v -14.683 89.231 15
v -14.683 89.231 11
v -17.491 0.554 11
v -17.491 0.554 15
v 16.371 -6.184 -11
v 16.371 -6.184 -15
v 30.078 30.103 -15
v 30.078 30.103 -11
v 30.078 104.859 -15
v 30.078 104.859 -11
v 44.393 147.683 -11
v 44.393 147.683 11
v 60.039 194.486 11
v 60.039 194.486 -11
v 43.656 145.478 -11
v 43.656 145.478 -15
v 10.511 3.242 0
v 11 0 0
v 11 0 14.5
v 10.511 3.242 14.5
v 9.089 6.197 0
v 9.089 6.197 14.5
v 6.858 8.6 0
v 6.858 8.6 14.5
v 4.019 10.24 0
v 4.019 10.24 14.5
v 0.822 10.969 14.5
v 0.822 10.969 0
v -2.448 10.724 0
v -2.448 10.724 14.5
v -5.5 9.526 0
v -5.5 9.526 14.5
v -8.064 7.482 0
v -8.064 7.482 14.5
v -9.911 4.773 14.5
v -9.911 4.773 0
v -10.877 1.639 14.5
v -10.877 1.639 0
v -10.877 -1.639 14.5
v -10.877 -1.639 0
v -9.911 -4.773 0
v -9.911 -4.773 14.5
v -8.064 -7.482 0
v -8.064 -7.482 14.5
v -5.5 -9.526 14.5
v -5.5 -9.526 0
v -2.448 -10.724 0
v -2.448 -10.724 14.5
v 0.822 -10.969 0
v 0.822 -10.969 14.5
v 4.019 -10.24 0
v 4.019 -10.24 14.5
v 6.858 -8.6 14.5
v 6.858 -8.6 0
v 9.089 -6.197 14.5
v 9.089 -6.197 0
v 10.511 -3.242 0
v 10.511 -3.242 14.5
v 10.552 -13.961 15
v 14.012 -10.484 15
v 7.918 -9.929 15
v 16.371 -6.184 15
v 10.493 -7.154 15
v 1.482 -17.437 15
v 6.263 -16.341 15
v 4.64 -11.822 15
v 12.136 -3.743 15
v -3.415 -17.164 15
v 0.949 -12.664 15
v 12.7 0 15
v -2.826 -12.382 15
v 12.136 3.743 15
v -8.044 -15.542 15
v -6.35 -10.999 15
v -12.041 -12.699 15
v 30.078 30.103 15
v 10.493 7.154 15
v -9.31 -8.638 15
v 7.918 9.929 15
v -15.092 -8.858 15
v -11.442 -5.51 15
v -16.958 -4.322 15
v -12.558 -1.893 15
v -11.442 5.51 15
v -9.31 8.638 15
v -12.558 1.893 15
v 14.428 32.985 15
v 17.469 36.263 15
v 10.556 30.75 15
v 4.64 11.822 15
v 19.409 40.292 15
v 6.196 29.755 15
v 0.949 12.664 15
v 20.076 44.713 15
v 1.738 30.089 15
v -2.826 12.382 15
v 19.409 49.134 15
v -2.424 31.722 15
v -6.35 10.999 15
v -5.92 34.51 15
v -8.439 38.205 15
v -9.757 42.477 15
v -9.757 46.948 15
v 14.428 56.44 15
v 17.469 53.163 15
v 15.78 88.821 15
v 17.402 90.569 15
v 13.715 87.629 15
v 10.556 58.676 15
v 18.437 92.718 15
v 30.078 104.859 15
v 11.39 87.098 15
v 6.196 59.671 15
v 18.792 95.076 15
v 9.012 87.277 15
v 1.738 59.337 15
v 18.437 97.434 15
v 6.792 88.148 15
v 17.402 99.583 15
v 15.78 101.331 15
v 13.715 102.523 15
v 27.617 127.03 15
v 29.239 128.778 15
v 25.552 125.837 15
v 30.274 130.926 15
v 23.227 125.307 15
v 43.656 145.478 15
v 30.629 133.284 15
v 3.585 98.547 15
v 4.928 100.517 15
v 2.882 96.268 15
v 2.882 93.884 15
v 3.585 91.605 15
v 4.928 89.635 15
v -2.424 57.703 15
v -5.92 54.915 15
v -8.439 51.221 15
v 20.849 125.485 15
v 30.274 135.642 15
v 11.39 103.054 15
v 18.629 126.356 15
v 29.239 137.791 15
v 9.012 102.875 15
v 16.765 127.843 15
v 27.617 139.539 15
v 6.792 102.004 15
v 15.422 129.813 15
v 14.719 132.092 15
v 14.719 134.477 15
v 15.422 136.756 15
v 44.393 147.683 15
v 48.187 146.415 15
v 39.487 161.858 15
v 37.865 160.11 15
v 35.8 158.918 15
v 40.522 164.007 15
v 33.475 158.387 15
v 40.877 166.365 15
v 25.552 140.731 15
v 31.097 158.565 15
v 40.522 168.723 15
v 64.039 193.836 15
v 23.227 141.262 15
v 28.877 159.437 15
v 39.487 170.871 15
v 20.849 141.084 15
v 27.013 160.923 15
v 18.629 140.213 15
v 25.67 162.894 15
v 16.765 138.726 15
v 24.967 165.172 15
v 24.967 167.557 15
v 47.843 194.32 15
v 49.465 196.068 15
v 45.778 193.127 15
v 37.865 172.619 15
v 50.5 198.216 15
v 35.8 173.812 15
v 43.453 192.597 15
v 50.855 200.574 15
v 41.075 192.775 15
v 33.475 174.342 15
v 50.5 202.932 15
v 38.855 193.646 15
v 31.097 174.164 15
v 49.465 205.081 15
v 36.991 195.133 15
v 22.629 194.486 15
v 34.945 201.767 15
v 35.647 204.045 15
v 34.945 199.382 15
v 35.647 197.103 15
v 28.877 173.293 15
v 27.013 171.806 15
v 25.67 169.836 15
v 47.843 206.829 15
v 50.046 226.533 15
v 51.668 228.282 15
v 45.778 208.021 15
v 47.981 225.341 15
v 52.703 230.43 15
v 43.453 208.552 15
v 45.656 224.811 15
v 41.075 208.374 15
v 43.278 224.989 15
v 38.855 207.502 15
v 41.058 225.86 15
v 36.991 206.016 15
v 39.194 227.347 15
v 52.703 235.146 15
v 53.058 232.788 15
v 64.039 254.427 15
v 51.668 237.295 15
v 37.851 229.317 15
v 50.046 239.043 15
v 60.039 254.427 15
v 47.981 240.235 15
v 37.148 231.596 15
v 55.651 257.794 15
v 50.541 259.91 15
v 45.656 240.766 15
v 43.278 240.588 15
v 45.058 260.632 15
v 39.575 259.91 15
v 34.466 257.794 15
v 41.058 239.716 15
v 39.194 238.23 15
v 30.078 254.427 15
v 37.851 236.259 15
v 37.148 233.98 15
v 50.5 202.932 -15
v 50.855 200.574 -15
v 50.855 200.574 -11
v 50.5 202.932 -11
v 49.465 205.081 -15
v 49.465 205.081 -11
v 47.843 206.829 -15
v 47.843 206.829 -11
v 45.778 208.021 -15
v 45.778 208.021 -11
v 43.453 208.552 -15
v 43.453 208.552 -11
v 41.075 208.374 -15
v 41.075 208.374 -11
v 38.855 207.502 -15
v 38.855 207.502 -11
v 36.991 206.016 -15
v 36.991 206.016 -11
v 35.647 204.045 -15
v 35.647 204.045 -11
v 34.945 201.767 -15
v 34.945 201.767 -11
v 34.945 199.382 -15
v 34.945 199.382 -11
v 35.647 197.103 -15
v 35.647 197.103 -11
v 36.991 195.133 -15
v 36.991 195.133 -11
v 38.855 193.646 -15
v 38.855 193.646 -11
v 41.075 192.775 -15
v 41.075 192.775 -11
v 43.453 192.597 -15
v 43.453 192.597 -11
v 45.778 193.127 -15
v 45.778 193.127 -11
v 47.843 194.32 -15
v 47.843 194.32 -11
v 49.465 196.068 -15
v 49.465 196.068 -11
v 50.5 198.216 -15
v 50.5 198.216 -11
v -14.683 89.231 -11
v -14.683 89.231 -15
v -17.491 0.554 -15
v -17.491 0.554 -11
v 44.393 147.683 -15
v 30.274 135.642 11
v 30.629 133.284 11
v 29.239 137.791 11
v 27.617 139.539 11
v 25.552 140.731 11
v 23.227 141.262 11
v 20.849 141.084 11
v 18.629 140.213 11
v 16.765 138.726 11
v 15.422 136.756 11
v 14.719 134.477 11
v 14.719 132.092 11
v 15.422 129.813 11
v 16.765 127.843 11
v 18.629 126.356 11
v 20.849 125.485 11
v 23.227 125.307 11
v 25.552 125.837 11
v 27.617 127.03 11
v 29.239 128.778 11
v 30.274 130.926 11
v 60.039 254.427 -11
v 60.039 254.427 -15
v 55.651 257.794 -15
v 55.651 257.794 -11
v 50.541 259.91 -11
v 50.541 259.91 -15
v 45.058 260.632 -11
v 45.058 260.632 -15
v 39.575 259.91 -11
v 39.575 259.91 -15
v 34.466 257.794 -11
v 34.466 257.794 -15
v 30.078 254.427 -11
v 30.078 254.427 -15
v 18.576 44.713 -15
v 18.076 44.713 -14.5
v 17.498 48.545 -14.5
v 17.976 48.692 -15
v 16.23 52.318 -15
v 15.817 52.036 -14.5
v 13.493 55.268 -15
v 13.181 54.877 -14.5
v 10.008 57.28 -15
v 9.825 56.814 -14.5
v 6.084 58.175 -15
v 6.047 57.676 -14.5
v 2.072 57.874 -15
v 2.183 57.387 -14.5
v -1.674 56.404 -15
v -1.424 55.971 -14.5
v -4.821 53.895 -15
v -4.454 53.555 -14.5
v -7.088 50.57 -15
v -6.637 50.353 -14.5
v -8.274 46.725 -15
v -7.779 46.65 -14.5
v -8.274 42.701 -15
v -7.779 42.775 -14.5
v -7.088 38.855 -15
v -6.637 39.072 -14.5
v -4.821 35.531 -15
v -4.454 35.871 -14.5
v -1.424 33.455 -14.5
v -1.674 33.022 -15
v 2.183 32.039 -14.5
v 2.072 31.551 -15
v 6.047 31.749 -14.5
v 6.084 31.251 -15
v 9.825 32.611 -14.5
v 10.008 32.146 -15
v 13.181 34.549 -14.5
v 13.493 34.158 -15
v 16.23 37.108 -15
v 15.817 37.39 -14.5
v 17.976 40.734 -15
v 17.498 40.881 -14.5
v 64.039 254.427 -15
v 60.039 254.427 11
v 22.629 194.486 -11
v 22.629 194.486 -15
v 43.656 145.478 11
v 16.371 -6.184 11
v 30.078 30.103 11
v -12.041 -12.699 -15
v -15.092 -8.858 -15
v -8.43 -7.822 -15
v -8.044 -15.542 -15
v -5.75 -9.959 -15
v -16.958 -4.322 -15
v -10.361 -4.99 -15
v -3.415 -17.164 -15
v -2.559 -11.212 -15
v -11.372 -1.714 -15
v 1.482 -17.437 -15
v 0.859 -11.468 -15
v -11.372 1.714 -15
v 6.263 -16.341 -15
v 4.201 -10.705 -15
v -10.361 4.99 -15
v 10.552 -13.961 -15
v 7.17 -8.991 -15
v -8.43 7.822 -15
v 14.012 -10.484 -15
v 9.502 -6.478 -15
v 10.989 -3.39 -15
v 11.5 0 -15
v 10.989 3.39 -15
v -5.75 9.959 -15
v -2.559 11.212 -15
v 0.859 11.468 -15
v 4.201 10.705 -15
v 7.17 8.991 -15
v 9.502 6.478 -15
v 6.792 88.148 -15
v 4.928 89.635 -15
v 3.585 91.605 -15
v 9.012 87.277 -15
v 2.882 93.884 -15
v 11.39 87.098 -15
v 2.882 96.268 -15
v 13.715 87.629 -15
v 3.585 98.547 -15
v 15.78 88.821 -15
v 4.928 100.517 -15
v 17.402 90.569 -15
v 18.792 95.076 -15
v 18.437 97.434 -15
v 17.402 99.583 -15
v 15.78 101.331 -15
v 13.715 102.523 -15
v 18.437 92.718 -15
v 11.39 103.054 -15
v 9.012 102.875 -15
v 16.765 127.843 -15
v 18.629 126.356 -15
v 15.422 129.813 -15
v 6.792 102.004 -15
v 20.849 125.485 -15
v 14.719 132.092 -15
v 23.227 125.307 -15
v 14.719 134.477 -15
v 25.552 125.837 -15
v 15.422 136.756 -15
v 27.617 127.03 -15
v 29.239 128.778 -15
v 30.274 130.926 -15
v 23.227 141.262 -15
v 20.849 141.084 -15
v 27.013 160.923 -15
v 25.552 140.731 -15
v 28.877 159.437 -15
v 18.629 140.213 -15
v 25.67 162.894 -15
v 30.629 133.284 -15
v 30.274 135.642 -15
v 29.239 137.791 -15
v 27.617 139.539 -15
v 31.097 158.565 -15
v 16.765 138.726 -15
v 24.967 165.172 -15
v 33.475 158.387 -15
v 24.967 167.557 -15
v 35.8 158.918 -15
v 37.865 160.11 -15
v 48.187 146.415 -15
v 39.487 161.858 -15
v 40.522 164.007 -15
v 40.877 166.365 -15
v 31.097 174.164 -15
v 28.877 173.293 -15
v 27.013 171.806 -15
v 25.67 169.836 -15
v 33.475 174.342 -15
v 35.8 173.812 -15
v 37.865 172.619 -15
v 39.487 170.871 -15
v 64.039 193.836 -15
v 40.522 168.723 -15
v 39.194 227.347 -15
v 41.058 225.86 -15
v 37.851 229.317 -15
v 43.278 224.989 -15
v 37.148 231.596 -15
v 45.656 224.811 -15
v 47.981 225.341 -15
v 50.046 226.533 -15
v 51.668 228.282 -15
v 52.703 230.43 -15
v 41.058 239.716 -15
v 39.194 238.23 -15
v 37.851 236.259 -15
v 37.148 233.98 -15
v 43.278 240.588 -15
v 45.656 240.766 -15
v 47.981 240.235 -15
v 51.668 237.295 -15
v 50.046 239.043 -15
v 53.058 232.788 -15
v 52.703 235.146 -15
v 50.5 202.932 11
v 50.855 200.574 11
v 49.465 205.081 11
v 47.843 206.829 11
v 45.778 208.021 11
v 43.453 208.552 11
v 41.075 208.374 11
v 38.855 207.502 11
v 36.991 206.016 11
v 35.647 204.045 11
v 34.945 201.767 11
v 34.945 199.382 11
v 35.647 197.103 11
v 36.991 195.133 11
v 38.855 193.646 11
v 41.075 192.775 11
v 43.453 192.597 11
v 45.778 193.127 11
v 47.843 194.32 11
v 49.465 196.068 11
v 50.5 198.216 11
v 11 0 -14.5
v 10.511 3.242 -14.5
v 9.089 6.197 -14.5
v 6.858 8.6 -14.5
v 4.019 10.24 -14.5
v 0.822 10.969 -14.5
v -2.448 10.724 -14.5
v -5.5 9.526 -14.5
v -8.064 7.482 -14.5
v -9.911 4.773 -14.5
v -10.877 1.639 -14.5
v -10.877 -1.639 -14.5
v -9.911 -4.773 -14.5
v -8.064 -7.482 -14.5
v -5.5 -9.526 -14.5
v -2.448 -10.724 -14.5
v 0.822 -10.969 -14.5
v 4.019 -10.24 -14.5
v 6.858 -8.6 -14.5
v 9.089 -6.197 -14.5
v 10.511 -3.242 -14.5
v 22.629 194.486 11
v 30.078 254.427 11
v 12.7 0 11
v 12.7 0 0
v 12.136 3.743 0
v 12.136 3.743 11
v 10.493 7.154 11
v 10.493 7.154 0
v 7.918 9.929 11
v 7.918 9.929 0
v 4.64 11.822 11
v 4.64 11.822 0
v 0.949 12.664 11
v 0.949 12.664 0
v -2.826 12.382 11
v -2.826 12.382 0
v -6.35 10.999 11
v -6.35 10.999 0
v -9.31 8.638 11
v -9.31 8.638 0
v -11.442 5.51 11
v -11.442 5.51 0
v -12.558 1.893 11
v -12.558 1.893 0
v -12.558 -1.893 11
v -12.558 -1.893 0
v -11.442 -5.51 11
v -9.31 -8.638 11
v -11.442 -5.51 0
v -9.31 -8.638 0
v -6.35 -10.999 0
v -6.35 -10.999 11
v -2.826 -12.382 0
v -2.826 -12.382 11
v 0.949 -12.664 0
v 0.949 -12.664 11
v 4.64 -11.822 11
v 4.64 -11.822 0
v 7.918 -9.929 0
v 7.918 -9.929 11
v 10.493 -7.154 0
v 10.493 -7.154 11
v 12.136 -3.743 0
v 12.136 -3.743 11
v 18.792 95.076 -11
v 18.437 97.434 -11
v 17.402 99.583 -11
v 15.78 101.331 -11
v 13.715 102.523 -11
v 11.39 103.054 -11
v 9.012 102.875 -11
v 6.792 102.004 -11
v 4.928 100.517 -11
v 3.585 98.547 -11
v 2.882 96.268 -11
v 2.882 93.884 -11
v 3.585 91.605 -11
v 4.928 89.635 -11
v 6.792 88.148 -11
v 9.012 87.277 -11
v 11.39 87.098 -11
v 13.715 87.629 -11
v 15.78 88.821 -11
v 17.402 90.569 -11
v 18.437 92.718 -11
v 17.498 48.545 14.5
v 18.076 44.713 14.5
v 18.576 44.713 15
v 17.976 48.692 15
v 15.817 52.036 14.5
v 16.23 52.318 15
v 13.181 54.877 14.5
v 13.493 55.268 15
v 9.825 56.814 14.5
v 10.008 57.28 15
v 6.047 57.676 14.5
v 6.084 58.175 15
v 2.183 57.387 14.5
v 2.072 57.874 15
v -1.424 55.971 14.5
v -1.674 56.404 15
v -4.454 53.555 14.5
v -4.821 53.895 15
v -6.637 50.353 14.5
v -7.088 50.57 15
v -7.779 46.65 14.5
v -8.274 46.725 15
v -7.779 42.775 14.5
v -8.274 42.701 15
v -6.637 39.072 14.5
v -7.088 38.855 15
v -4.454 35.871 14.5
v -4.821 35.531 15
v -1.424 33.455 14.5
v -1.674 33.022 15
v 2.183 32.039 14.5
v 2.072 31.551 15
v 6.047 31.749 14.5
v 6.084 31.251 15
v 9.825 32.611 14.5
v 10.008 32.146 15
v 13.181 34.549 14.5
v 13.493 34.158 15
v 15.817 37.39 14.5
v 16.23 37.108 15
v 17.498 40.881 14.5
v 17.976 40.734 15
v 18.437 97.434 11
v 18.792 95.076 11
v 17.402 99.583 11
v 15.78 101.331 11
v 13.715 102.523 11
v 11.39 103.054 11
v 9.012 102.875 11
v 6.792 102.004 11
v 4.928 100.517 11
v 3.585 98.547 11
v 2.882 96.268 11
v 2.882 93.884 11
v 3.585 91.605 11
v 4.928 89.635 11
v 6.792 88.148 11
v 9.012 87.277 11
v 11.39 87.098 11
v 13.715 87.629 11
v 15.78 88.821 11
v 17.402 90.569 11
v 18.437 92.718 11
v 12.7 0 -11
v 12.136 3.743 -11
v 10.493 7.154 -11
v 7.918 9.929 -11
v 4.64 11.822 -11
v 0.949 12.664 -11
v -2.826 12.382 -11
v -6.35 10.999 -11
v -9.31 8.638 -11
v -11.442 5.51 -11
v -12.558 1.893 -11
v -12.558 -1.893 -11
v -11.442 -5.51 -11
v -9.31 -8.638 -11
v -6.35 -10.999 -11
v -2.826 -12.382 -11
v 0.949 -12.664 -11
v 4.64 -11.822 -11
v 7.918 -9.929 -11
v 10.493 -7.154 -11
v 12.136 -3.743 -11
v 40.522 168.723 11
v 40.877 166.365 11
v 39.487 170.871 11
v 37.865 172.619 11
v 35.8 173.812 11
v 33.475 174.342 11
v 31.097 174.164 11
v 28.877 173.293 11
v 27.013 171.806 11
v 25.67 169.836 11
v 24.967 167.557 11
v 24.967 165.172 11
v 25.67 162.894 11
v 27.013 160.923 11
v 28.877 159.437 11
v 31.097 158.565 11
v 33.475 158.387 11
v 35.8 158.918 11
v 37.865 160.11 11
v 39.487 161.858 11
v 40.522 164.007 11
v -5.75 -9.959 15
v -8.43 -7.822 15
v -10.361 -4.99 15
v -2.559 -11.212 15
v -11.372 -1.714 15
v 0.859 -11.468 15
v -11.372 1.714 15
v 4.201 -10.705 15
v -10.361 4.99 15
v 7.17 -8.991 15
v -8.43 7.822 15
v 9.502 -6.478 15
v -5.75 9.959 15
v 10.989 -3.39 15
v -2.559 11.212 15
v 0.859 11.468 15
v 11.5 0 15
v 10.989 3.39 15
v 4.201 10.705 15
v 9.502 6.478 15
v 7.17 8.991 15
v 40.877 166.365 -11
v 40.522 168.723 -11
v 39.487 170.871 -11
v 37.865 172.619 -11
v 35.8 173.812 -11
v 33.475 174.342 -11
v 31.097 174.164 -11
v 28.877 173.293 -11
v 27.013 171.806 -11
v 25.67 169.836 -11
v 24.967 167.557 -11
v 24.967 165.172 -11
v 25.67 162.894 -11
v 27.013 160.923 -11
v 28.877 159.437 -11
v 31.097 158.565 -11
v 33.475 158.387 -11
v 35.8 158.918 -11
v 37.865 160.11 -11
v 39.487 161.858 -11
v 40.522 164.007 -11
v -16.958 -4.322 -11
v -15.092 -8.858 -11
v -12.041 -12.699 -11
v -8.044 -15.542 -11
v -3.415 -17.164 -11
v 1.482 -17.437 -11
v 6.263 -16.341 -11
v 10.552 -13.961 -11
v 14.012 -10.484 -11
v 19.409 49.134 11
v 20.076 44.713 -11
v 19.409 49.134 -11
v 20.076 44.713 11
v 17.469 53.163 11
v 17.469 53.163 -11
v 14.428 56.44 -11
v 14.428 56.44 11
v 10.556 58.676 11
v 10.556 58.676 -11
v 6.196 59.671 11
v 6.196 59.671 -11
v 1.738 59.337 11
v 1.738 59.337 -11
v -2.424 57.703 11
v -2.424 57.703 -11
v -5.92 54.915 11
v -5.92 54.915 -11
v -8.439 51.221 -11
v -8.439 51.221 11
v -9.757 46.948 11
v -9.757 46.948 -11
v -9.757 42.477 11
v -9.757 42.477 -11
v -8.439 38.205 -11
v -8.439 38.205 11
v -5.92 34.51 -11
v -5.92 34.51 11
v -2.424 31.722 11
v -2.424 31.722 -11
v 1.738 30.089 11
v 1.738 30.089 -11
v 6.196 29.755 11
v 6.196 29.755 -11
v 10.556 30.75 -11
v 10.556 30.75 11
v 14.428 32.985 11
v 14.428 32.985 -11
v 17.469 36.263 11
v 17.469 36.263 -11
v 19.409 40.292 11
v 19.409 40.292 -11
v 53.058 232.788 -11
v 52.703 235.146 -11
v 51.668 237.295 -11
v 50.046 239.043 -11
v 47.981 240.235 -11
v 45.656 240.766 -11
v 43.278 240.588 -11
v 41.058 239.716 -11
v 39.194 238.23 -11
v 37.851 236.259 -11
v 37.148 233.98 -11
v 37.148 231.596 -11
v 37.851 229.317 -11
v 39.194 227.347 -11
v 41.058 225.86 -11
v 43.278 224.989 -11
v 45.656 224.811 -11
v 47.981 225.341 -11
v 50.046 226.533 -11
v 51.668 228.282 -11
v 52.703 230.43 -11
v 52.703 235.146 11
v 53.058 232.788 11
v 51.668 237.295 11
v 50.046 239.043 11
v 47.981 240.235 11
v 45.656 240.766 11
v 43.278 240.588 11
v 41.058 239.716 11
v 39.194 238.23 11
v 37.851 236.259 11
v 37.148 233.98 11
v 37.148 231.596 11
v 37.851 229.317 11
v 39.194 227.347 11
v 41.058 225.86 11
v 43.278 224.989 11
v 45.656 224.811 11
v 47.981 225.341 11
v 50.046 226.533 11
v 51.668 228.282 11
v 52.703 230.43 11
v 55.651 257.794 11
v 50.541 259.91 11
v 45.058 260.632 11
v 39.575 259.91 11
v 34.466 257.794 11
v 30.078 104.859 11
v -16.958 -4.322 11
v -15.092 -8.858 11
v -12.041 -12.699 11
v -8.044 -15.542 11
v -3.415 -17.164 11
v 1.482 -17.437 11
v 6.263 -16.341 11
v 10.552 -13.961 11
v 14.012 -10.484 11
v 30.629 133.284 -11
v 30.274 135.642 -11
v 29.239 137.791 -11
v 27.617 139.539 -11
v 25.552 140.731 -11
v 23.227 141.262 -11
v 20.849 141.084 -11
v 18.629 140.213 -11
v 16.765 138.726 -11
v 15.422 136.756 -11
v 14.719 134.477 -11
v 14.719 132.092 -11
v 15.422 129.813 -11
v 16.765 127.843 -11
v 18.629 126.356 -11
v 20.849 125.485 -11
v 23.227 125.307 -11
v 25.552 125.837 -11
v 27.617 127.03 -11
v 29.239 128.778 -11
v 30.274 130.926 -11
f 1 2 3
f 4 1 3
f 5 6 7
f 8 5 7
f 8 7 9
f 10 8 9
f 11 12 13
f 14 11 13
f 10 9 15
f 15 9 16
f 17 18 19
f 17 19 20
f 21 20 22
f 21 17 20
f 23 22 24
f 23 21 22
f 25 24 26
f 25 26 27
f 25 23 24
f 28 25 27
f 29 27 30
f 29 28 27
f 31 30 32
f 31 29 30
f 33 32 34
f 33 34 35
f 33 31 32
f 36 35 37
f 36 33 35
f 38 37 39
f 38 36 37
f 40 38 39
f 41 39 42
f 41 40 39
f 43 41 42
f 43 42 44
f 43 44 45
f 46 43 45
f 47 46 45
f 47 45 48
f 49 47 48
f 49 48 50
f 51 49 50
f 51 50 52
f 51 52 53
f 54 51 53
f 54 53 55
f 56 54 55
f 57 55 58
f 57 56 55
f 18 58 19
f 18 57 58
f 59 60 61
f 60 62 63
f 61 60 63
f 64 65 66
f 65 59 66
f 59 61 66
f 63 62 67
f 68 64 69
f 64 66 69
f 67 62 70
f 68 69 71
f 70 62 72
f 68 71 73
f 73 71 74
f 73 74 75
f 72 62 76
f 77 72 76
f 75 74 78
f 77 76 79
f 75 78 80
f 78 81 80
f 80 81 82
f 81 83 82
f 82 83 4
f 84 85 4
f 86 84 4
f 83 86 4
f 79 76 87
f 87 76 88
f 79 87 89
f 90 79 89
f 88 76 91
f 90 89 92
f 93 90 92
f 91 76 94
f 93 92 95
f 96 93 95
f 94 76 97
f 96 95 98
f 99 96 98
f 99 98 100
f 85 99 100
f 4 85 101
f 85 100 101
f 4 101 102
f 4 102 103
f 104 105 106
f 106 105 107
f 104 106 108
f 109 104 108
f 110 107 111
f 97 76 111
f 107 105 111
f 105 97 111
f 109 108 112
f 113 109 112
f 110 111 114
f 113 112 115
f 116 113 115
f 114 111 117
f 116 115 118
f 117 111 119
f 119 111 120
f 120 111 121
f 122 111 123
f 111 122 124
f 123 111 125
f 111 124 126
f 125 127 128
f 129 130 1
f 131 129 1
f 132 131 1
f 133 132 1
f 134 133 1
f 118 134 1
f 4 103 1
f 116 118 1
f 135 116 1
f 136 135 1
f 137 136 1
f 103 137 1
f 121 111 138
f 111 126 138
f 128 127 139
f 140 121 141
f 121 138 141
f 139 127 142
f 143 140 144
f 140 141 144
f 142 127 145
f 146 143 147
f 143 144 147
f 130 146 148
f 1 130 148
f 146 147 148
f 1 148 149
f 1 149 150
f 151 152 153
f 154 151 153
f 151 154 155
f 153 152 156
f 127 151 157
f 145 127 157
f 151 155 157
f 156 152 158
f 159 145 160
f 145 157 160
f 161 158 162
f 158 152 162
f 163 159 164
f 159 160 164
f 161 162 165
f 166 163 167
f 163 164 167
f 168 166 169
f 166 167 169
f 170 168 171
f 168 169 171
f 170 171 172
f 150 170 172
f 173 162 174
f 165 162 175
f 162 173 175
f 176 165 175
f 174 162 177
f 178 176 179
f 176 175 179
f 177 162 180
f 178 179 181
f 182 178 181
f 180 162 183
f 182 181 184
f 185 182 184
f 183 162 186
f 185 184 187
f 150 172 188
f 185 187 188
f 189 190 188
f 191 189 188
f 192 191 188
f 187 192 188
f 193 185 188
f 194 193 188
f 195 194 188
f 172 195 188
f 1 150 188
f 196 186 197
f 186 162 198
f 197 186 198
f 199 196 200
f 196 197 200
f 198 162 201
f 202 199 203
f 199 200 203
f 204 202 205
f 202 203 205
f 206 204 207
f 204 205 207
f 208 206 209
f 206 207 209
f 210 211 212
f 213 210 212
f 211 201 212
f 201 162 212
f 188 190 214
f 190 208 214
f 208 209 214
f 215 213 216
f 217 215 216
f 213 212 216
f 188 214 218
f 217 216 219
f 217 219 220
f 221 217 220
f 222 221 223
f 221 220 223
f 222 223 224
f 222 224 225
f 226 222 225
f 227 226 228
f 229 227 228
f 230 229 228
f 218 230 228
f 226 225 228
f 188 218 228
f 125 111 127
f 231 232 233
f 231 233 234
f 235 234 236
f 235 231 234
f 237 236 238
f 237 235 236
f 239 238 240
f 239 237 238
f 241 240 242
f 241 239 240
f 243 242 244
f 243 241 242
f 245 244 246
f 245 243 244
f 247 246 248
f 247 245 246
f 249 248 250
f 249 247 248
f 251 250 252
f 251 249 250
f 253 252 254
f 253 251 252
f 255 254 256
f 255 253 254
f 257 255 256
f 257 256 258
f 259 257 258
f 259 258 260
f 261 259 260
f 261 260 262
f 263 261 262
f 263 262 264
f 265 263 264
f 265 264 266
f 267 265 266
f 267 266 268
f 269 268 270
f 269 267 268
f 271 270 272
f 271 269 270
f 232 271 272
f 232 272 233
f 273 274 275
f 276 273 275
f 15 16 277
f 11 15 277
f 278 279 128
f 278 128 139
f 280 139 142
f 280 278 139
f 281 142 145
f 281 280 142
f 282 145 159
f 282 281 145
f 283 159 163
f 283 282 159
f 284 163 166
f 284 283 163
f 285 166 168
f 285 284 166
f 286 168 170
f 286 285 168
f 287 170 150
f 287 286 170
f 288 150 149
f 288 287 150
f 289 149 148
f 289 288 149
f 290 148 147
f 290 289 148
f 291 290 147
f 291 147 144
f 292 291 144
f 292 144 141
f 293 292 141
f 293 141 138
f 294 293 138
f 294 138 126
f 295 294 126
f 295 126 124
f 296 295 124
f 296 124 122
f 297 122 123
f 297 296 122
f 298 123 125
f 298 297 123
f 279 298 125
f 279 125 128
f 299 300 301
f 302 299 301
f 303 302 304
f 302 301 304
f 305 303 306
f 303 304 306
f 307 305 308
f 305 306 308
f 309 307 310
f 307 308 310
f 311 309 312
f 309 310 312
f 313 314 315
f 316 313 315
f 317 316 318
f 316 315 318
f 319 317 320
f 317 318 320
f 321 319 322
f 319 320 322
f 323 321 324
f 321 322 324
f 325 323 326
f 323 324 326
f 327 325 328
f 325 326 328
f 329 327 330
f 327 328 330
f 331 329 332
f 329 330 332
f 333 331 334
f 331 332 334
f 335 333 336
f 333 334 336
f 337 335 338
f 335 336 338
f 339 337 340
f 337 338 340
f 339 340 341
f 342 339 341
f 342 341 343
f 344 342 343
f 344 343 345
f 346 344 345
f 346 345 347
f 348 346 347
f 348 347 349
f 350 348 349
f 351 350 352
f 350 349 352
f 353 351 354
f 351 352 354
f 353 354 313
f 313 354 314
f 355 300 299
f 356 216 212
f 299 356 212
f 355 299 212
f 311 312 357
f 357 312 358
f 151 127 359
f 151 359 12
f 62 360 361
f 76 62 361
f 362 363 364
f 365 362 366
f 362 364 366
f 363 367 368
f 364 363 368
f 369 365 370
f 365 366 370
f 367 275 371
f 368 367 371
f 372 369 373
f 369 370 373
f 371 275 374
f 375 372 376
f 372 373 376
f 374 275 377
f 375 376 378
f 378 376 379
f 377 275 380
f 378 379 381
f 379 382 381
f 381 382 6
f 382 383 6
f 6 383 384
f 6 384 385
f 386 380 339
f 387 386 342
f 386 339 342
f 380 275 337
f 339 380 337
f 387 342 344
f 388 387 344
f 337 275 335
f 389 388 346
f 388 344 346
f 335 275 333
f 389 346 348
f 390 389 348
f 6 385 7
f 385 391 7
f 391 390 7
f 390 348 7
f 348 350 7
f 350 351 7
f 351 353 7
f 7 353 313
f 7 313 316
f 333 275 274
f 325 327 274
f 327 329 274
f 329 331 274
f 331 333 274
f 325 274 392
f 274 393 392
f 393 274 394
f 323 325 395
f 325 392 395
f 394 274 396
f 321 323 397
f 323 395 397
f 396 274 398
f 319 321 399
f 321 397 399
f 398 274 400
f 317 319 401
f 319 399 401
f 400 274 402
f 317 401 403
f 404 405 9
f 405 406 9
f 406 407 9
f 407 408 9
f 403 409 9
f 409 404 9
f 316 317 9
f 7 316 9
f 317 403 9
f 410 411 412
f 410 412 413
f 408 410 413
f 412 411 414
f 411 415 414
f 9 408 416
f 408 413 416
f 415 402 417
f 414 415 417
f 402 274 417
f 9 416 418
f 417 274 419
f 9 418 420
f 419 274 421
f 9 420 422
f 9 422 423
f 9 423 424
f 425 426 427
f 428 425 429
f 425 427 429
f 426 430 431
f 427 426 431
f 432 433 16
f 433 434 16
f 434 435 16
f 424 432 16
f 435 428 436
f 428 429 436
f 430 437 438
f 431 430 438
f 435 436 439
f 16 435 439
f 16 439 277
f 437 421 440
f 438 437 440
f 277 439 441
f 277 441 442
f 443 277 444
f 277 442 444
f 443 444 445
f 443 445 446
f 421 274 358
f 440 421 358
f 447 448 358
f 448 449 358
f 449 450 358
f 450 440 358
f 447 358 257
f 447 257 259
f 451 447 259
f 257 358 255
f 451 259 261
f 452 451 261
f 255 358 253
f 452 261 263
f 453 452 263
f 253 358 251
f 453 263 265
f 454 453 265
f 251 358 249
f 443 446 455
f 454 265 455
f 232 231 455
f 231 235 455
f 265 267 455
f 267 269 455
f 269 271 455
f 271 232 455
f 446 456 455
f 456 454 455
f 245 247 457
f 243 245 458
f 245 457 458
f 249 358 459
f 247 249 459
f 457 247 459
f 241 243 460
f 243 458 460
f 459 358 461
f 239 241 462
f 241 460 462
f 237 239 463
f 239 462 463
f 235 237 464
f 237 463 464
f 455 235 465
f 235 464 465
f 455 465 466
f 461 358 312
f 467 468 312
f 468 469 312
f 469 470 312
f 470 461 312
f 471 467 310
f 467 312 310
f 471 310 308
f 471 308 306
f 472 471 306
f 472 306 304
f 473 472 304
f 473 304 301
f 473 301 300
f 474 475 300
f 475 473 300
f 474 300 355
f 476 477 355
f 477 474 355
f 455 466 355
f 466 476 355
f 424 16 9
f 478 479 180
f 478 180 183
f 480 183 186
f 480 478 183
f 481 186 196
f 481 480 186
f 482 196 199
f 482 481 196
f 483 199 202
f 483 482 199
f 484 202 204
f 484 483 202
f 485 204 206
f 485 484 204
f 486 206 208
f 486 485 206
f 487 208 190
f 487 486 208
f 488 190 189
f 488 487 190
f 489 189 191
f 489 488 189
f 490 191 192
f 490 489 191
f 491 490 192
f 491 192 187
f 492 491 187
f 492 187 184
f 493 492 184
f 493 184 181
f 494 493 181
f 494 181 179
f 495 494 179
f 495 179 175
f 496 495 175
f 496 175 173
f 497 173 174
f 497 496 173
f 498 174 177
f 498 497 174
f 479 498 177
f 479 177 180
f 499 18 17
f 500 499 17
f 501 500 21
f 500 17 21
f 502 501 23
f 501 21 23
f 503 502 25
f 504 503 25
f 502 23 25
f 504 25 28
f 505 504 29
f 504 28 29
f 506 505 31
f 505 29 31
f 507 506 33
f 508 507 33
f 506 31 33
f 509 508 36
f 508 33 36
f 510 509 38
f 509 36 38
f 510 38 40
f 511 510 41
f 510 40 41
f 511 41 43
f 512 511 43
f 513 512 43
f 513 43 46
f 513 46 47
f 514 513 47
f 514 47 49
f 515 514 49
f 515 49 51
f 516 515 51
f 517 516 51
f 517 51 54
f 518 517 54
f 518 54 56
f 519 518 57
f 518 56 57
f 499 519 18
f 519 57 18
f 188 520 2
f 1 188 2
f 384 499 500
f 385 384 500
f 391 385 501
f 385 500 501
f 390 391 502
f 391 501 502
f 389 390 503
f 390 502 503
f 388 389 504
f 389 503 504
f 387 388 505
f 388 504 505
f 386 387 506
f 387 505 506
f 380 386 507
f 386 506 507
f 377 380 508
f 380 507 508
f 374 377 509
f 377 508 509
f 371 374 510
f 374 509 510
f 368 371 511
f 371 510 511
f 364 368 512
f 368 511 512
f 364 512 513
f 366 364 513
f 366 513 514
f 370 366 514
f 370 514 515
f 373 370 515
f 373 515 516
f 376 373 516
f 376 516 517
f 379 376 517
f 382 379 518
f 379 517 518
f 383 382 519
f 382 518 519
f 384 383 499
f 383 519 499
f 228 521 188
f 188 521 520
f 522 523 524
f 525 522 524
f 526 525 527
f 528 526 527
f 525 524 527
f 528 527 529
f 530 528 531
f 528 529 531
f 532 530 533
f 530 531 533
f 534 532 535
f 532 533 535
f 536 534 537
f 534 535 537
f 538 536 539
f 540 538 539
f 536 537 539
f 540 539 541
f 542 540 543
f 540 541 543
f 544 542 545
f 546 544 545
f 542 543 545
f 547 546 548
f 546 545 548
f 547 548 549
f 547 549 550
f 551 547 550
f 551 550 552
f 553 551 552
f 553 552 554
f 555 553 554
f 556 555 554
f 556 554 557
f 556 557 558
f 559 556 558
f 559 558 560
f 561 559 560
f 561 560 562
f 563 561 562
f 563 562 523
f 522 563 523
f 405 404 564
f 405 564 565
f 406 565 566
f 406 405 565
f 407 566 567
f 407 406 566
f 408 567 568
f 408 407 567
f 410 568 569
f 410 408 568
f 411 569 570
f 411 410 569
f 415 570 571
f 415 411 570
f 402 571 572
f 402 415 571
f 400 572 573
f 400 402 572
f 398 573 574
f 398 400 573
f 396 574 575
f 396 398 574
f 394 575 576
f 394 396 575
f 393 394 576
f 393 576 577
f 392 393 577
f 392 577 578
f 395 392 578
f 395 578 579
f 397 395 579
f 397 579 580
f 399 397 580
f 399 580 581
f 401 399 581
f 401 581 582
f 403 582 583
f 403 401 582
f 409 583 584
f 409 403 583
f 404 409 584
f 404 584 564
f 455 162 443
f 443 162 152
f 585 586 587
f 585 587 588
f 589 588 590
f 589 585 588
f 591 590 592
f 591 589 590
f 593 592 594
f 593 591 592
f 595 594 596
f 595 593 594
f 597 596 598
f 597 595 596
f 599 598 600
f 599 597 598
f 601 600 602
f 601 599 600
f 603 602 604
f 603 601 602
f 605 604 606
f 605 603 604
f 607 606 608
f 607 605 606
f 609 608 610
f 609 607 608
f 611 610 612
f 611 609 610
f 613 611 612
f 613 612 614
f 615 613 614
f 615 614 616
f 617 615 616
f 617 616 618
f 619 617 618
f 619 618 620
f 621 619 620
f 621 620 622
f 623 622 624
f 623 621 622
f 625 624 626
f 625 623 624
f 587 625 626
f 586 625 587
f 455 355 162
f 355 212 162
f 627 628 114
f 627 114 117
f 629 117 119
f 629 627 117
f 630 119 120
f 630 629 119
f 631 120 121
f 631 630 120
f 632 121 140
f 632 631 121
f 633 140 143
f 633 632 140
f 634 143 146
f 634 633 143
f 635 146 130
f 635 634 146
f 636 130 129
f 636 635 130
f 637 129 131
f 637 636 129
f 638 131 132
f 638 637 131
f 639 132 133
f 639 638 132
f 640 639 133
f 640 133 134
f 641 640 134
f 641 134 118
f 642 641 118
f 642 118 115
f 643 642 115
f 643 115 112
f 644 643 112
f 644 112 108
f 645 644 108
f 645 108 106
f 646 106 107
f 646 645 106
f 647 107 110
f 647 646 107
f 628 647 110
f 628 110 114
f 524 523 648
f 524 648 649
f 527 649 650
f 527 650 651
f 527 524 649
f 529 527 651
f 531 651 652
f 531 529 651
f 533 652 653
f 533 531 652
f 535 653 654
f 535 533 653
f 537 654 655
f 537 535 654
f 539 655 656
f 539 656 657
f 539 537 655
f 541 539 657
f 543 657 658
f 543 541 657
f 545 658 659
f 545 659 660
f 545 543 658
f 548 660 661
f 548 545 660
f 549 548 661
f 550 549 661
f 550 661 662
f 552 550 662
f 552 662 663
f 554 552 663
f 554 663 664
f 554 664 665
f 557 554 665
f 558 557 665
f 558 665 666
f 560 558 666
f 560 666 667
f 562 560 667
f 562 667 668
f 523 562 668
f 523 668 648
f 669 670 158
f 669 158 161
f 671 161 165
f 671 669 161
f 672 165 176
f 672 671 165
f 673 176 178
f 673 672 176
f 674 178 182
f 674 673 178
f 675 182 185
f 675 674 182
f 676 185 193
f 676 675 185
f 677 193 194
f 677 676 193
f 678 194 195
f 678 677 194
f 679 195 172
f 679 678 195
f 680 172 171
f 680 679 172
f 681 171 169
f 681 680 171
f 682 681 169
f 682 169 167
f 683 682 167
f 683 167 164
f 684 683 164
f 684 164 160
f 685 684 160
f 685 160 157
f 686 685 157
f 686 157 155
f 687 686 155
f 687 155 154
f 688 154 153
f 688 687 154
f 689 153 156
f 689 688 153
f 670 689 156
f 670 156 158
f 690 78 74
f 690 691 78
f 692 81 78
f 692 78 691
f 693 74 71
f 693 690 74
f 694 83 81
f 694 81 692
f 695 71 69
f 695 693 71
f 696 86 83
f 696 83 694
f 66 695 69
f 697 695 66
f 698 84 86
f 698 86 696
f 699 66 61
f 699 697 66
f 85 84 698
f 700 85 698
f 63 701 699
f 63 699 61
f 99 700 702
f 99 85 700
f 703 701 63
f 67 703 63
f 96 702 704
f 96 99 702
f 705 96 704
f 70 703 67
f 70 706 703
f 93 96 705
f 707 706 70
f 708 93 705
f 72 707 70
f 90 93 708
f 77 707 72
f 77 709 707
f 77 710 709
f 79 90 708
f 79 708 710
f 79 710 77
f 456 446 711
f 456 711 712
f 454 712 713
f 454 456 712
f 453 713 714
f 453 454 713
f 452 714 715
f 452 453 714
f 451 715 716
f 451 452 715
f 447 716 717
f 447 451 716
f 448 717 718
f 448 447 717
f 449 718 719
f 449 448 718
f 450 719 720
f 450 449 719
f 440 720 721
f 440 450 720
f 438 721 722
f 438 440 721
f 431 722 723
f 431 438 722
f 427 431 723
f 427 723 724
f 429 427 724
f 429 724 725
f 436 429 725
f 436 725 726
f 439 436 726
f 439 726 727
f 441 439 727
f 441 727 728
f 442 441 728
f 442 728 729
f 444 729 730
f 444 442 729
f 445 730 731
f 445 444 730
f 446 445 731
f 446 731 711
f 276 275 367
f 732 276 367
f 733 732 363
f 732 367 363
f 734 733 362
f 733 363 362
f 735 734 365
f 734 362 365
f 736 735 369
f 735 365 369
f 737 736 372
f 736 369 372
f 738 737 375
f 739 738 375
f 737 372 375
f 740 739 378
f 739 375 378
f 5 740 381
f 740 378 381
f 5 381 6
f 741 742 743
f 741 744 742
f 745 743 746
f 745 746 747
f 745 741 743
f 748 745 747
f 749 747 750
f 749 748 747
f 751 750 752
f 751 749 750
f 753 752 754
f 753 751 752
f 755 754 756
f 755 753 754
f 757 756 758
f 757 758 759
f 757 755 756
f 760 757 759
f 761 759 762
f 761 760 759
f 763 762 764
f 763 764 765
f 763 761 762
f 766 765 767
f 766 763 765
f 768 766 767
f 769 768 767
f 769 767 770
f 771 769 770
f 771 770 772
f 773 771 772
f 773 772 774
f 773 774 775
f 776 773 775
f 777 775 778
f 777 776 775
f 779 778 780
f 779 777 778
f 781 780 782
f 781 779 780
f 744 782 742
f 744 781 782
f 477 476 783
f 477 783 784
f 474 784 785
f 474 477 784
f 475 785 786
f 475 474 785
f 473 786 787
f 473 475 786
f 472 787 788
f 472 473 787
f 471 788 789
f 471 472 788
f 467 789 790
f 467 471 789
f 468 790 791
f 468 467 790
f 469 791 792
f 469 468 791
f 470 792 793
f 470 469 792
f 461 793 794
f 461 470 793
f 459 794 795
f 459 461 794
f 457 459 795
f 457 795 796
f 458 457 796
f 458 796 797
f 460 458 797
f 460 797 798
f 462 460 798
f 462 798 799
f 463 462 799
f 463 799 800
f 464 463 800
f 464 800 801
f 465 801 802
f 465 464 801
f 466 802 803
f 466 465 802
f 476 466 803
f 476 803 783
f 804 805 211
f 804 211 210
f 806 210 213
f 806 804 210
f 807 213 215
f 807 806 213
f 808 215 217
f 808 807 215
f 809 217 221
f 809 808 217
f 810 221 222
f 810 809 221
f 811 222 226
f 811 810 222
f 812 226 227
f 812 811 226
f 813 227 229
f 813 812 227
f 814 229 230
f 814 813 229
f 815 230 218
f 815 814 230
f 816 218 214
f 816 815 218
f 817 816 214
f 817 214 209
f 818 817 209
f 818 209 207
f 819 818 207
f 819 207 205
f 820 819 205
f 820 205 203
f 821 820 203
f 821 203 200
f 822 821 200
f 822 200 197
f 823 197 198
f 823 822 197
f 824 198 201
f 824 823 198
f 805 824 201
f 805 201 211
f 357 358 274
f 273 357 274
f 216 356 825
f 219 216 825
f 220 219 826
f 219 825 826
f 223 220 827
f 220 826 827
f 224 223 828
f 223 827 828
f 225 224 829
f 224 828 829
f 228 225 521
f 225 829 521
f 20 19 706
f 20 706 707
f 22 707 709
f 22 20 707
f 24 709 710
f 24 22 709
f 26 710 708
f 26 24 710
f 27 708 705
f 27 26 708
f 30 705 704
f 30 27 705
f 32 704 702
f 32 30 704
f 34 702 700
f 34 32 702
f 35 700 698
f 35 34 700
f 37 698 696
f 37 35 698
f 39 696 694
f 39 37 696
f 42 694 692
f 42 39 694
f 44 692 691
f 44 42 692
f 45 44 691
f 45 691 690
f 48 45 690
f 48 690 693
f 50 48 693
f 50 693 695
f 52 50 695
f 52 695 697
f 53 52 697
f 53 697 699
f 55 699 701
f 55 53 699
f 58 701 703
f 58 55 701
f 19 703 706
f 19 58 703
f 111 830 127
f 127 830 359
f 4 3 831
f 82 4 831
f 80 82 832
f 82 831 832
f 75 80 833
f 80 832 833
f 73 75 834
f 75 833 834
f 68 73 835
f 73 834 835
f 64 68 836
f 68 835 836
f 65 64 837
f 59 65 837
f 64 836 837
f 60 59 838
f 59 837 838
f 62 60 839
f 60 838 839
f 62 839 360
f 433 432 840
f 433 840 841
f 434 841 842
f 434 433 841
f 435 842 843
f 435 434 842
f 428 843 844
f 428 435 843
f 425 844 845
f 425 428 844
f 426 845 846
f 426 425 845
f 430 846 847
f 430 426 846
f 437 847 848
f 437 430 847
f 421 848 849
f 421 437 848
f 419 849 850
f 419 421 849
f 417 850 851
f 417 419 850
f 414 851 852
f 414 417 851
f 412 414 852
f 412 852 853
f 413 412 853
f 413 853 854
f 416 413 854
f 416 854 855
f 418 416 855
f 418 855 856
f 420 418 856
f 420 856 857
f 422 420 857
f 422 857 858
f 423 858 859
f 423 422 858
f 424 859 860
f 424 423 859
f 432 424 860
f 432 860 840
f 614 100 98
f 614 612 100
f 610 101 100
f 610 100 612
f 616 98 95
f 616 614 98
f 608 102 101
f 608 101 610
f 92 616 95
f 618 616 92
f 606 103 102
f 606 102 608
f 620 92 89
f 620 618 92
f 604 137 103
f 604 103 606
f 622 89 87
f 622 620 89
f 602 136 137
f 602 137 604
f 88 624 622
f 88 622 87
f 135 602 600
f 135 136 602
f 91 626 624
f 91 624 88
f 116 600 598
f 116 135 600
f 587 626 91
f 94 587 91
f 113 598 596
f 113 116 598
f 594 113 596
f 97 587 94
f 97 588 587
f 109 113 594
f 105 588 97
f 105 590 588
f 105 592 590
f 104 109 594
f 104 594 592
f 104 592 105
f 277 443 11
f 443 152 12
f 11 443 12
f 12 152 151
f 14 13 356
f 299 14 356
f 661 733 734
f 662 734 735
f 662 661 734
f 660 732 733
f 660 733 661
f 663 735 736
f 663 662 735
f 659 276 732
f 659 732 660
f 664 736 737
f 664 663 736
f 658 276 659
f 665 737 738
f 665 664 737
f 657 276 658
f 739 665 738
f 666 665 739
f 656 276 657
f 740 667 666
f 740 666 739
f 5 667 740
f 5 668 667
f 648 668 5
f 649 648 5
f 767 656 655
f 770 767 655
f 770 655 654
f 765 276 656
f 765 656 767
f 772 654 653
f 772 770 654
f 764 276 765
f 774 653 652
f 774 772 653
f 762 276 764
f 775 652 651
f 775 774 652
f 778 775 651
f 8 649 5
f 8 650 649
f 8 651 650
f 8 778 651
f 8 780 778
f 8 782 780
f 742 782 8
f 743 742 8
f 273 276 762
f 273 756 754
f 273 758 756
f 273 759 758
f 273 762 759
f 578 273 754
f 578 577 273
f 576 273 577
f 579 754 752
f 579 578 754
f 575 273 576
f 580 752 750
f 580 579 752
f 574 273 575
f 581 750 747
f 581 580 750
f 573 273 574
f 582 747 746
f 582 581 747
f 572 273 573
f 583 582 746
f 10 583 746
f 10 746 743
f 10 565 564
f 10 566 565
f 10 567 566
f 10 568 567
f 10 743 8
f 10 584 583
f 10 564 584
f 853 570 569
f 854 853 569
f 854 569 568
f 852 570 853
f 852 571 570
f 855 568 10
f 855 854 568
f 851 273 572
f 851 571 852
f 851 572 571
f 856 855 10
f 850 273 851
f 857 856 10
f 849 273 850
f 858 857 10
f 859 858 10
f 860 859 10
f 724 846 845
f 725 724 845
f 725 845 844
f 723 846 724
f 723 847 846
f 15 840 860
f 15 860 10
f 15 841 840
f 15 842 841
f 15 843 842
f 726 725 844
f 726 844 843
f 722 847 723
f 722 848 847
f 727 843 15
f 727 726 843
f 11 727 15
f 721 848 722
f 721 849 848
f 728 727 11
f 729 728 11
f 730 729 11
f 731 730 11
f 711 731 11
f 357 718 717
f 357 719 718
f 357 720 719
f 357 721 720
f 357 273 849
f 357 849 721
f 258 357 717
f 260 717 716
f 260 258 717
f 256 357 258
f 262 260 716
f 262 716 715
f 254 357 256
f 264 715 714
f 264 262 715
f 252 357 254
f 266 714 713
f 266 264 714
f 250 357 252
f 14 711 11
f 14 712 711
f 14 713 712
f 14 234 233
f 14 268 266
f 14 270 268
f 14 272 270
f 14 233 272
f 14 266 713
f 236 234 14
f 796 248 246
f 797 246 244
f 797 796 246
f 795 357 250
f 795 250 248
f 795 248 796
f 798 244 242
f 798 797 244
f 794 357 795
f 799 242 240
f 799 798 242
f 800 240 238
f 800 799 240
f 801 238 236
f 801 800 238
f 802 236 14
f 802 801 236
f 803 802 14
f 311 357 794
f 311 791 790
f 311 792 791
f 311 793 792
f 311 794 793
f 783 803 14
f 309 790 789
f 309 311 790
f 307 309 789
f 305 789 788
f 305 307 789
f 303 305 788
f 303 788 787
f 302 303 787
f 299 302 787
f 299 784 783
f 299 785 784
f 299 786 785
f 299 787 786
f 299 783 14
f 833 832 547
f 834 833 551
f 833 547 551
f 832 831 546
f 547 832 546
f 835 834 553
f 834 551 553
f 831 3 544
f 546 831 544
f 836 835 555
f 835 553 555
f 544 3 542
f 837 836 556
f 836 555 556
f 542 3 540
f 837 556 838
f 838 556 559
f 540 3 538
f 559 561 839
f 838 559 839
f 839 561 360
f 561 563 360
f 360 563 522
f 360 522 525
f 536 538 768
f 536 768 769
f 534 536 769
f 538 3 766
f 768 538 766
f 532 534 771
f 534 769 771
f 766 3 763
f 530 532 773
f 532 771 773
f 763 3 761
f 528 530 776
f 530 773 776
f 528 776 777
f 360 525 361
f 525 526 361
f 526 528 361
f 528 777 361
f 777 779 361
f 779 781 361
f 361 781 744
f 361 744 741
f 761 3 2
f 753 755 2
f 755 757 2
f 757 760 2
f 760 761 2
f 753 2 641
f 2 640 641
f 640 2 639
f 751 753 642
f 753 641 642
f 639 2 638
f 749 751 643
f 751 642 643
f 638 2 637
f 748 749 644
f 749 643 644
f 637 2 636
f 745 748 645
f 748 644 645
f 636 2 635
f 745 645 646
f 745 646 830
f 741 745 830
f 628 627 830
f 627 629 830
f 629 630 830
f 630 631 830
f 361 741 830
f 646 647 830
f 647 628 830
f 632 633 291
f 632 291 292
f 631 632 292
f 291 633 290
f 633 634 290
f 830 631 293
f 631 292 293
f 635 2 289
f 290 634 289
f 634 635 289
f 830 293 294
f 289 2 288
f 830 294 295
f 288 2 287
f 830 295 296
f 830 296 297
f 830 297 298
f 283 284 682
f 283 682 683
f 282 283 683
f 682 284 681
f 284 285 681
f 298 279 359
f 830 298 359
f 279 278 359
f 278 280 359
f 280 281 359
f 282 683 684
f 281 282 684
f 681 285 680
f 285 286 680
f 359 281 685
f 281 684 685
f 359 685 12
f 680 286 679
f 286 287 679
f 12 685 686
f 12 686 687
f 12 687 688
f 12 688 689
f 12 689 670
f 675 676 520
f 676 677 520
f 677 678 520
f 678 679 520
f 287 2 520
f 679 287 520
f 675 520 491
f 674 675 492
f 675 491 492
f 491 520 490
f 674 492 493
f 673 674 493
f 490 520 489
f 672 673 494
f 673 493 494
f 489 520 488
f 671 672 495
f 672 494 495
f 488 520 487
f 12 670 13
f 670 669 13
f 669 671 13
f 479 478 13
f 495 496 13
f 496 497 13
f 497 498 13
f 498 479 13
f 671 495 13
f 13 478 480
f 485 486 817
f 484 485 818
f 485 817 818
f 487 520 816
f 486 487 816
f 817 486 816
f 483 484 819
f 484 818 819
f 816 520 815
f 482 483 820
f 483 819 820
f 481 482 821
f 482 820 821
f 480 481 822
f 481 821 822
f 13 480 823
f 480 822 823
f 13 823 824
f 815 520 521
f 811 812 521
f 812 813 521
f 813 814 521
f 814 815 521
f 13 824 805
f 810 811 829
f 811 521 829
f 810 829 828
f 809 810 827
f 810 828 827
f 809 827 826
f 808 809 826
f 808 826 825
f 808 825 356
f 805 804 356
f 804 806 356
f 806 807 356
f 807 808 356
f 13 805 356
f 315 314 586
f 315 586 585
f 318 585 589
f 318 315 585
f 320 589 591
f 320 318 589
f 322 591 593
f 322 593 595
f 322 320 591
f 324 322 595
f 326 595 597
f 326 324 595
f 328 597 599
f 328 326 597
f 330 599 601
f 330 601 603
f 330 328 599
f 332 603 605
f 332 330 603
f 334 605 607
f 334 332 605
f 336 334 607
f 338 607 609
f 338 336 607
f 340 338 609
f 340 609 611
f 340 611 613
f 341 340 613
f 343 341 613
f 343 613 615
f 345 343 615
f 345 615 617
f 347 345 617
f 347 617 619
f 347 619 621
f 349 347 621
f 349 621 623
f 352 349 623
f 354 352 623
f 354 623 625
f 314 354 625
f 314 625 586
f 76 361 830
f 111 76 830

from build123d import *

# Parameters (mm, degrees)
BOSS_EXTRUDE1_START = 11
SKETCH2_R           = 12.7
SKETCH2_R_2         = 8
SKETCH2_R_3         = 15
BOSS_EXTRUDE1_DEPTH = 4
LPATTERN1_COUNT     = 2
LPATTERN1_PITCH     = 26
BOSS_EXTRUDE2_DEPTH = 15
SKETCH4_R           = 12.7
SKETCH4_R_2         = 11
SKETCH4_R_3         = 15
SKETCH4_R_4         = 13
BOSS_EXTRUDE3_DEPTH = 15
CHAMFER2_SIZE       = 0.5


with BuildPart() as part:
    # Sketch2 → Boss-Extrude1 (new body)
    with BuildSketch(Plane.XY.offset(BOSS_EXTRUDE1_START)):
        with BuildLine():
            Line((30.078103468, 30.102899094), (30.078103468, 104.858637586))
            Line((30.078103468, 104.858637586), (43.656234688, 145.478166756))
            Line((43.656234688, 145.478166756), (60.038536544, 194.486485935))
            Line((60.038536544, 194.486485935), (60.038536544, 254.427096014))
            ThreePointArc((60.038536544, 254.427096014), (45.05832001, 260.632104877), (30.078103469, 254.427096029))
            Line((30.078103469, 254.427096029), (22.62926434, 194.486485916))
            Line((22.62926434, 194.486485916), (-14.683335653, 89.230795609))
            Line((-14.683335653, 89.230795609), (-17.49123357, 0.553848547))
            ThreePointArc((-17.49123357, 0.553848547), (-3.415184823, -17.163522734), (16.370945819, -6.184022397))
            Line((16.370945819, -6.184022397), (30.078103468, 30.102899094))
        make_face()
        Circle(SKETCH2_R, mode=Mode.SUBTRACT)
        with Locations((45.058319997, 232.788133995)):
            Circle(SKETCH2_R_2, mode=Mode.SUBTRACT)
        with Locations((42.85515341, 200.574247039)):
            Circle(SKETCH2_R_2, mode=Mode.SUBTRACT)
        with Locations((32.877400798, 166.36480954)):
            Circle(SKETCH2_R_2, mode=Mode.SUBTRACT)
        with Locations((22.629264347, 133.284451418)):
            Circle(SKETCH2_R_2, mode=Mode.SUBTRACT)
        with Locations((10.792452444, 95.075946031)):
            Circle(SKETCH2_R_2, mode=Mode.SUBTRACT)
        with Locations((5.075535148, 44.712849864)):
            Circle(SKETCH2_R_3, mode=Mode.SUBTRACT)
    extrude(amount=BOSS_EXTRUDE1_DEPTH)


with BuildPart() as lpattern1_1:
    # LPattern1: pattern copy
    add(part.part.moved(Location(Vector(0, 0, -1) * (1 * LPATTERN1_PITCH))))


with BuildPart() as part_1:
    add(part.part)

    add(lpattern1_1.part)  # Boss-Extrude2 merges LPattern1_1
    # Sketch3 → Boss-Extrude2 (add, symmetric)
    with BuildSketch(Plane.XY):
        Polygon((60.038536544, 194.486485935), (60.038536544, 254.427096014), (64.038536544, 254.427096014), (64.038536544, 193.835634299), (48.186924823, 146.414896158), (44.393265771, 147.683025095), align=None)
    extrude(amount=BOSS_EXTRUDE2_DEPTH, both=True)

    # Sketch4 → Boss-Extrude3 (add, symmetric)
    # profile 1 of 2: a face of its own
    with BuildSketch(Plane.XY):
        Circle(SKETCH4_R)
        Circle(SKETCH4_R_2, mode=Mode.SUBTRACT)
    # profile 2 of 2: a face of its own
    with BuildSketch(Plane.XY):
        with Locations((5.075535148, 44.712849864)):
            Circle(SKETCH4_R_3)
        with Locations((5.075535148, 44.712849864)):
            Circle(SKETCH4_R_4, mode=Mode.SUBTRACT)
    extrude(amount=BOSS_EXTRUDE3_DEPTH, both=True)

    # Chamfer2
    chamfer2_edges = [part_1.edges().sort_by_distance(p)[0] for p in [
        (-11, 0, -15),
        (-11, 0, 15),
        (-7.924464852, 44.712849864, -15),
        (-7.924464852, 44.712849864, 15),
    ]]
    chamfer(chamfer2_edges, length=CHAMFER2_SIZE)


solid = part_1.part
